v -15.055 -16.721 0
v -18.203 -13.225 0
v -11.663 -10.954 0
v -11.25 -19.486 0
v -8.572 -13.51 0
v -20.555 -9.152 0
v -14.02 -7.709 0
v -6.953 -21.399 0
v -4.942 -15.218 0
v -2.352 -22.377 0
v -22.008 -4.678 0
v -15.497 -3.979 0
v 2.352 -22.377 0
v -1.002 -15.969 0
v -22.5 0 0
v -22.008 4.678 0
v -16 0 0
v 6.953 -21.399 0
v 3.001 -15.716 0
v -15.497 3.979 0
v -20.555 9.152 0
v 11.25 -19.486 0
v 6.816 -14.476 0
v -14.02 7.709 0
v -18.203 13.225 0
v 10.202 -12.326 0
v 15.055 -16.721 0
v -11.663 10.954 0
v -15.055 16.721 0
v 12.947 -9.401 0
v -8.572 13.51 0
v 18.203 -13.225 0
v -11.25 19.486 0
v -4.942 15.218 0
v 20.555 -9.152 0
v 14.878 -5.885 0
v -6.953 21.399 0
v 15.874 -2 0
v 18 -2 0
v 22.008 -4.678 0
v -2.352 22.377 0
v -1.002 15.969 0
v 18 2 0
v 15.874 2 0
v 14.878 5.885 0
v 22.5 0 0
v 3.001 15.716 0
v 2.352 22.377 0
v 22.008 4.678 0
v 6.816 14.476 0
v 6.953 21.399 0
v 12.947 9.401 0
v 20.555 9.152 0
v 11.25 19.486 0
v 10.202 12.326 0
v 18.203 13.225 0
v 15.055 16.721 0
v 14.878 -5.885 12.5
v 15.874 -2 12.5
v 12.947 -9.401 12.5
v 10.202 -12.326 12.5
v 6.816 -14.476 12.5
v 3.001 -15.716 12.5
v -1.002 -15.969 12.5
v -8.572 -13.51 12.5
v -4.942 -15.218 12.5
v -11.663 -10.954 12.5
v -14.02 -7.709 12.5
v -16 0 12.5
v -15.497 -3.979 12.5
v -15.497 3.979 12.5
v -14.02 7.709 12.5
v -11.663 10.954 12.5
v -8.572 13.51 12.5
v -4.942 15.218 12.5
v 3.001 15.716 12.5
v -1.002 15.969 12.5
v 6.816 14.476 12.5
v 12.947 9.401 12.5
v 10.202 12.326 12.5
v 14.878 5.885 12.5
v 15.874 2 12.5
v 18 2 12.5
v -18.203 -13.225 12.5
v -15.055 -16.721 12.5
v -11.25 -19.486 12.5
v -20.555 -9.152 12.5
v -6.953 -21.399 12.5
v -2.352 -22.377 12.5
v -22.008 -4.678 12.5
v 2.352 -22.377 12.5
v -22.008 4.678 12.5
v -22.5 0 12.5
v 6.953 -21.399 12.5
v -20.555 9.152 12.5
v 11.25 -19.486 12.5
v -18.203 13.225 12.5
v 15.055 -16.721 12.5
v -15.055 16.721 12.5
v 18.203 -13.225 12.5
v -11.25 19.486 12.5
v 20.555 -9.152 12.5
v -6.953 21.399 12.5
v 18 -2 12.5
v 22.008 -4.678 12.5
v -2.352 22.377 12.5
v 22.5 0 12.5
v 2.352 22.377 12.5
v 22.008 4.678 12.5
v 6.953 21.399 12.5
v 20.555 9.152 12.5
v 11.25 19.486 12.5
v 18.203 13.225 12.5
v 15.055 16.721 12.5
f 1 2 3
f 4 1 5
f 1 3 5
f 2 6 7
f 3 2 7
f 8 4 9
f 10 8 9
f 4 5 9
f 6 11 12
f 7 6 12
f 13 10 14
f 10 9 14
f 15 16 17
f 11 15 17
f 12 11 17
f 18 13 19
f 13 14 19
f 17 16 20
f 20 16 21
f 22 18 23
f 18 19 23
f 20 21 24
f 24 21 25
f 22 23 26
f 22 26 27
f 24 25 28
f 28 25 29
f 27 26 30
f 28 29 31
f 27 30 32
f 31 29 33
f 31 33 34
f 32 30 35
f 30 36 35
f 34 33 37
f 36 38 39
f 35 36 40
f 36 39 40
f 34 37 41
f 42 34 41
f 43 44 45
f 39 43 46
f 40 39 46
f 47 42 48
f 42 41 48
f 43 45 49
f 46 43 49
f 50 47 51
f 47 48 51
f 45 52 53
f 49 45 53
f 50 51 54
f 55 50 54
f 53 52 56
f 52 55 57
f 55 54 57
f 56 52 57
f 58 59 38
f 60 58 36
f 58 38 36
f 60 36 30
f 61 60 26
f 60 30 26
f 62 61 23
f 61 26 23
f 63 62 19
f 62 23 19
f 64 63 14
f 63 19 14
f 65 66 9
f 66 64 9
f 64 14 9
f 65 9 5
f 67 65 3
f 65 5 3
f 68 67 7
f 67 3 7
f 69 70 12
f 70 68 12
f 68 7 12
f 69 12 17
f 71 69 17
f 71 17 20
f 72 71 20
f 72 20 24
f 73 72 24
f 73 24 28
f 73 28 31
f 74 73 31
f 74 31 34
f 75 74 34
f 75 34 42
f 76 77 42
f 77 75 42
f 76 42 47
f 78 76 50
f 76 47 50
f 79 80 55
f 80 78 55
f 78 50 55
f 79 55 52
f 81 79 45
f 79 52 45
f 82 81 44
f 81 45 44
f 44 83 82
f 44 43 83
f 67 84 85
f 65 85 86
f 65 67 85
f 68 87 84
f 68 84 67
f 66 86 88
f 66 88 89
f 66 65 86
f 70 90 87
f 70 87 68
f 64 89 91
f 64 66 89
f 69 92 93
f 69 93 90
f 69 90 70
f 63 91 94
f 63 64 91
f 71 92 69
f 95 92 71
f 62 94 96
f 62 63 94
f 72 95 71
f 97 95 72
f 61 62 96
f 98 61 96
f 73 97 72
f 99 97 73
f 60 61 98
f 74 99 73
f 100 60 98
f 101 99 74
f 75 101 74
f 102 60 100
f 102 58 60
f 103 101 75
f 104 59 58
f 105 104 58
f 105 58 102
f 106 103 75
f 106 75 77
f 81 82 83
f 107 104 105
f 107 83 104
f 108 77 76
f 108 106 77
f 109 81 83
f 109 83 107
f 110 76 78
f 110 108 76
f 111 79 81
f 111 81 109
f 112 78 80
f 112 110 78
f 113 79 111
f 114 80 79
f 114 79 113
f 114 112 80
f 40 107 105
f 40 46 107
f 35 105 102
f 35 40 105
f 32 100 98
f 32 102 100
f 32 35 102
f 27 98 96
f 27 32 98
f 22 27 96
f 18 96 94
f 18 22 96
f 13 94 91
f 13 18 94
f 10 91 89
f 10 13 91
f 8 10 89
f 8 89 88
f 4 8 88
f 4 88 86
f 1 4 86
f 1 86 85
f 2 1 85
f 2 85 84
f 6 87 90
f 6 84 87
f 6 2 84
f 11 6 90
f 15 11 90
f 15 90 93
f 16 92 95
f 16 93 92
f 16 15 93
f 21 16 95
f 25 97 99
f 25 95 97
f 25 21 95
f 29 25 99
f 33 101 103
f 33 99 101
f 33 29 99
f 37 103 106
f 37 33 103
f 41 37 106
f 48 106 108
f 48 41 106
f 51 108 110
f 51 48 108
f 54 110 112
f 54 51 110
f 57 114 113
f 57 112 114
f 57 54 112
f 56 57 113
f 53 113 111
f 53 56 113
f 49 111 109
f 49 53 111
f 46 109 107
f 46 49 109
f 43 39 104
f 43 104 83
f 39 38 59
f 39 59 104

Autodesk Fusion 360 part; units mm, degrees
sketch "Sketch1" plane through (0, 0, 0) normal (0, 0, 1) x (1, 0, 0)
  circle A0 centre (0, 0) radius 16
  line L0 (0, 0) -> (16, 0)
  line L1 (15.8745, -2) -> (18, -2)
  line L2 (18, -2) -> (18, 2)
  line L3 (18, 2) -> (15.8745, 2)
  circle A1 centre (0, 0) radius 22.5
  dimension "d1" = 32
extrude "Extrude1" add sketch "Sketch1" along normal blind 12.5
